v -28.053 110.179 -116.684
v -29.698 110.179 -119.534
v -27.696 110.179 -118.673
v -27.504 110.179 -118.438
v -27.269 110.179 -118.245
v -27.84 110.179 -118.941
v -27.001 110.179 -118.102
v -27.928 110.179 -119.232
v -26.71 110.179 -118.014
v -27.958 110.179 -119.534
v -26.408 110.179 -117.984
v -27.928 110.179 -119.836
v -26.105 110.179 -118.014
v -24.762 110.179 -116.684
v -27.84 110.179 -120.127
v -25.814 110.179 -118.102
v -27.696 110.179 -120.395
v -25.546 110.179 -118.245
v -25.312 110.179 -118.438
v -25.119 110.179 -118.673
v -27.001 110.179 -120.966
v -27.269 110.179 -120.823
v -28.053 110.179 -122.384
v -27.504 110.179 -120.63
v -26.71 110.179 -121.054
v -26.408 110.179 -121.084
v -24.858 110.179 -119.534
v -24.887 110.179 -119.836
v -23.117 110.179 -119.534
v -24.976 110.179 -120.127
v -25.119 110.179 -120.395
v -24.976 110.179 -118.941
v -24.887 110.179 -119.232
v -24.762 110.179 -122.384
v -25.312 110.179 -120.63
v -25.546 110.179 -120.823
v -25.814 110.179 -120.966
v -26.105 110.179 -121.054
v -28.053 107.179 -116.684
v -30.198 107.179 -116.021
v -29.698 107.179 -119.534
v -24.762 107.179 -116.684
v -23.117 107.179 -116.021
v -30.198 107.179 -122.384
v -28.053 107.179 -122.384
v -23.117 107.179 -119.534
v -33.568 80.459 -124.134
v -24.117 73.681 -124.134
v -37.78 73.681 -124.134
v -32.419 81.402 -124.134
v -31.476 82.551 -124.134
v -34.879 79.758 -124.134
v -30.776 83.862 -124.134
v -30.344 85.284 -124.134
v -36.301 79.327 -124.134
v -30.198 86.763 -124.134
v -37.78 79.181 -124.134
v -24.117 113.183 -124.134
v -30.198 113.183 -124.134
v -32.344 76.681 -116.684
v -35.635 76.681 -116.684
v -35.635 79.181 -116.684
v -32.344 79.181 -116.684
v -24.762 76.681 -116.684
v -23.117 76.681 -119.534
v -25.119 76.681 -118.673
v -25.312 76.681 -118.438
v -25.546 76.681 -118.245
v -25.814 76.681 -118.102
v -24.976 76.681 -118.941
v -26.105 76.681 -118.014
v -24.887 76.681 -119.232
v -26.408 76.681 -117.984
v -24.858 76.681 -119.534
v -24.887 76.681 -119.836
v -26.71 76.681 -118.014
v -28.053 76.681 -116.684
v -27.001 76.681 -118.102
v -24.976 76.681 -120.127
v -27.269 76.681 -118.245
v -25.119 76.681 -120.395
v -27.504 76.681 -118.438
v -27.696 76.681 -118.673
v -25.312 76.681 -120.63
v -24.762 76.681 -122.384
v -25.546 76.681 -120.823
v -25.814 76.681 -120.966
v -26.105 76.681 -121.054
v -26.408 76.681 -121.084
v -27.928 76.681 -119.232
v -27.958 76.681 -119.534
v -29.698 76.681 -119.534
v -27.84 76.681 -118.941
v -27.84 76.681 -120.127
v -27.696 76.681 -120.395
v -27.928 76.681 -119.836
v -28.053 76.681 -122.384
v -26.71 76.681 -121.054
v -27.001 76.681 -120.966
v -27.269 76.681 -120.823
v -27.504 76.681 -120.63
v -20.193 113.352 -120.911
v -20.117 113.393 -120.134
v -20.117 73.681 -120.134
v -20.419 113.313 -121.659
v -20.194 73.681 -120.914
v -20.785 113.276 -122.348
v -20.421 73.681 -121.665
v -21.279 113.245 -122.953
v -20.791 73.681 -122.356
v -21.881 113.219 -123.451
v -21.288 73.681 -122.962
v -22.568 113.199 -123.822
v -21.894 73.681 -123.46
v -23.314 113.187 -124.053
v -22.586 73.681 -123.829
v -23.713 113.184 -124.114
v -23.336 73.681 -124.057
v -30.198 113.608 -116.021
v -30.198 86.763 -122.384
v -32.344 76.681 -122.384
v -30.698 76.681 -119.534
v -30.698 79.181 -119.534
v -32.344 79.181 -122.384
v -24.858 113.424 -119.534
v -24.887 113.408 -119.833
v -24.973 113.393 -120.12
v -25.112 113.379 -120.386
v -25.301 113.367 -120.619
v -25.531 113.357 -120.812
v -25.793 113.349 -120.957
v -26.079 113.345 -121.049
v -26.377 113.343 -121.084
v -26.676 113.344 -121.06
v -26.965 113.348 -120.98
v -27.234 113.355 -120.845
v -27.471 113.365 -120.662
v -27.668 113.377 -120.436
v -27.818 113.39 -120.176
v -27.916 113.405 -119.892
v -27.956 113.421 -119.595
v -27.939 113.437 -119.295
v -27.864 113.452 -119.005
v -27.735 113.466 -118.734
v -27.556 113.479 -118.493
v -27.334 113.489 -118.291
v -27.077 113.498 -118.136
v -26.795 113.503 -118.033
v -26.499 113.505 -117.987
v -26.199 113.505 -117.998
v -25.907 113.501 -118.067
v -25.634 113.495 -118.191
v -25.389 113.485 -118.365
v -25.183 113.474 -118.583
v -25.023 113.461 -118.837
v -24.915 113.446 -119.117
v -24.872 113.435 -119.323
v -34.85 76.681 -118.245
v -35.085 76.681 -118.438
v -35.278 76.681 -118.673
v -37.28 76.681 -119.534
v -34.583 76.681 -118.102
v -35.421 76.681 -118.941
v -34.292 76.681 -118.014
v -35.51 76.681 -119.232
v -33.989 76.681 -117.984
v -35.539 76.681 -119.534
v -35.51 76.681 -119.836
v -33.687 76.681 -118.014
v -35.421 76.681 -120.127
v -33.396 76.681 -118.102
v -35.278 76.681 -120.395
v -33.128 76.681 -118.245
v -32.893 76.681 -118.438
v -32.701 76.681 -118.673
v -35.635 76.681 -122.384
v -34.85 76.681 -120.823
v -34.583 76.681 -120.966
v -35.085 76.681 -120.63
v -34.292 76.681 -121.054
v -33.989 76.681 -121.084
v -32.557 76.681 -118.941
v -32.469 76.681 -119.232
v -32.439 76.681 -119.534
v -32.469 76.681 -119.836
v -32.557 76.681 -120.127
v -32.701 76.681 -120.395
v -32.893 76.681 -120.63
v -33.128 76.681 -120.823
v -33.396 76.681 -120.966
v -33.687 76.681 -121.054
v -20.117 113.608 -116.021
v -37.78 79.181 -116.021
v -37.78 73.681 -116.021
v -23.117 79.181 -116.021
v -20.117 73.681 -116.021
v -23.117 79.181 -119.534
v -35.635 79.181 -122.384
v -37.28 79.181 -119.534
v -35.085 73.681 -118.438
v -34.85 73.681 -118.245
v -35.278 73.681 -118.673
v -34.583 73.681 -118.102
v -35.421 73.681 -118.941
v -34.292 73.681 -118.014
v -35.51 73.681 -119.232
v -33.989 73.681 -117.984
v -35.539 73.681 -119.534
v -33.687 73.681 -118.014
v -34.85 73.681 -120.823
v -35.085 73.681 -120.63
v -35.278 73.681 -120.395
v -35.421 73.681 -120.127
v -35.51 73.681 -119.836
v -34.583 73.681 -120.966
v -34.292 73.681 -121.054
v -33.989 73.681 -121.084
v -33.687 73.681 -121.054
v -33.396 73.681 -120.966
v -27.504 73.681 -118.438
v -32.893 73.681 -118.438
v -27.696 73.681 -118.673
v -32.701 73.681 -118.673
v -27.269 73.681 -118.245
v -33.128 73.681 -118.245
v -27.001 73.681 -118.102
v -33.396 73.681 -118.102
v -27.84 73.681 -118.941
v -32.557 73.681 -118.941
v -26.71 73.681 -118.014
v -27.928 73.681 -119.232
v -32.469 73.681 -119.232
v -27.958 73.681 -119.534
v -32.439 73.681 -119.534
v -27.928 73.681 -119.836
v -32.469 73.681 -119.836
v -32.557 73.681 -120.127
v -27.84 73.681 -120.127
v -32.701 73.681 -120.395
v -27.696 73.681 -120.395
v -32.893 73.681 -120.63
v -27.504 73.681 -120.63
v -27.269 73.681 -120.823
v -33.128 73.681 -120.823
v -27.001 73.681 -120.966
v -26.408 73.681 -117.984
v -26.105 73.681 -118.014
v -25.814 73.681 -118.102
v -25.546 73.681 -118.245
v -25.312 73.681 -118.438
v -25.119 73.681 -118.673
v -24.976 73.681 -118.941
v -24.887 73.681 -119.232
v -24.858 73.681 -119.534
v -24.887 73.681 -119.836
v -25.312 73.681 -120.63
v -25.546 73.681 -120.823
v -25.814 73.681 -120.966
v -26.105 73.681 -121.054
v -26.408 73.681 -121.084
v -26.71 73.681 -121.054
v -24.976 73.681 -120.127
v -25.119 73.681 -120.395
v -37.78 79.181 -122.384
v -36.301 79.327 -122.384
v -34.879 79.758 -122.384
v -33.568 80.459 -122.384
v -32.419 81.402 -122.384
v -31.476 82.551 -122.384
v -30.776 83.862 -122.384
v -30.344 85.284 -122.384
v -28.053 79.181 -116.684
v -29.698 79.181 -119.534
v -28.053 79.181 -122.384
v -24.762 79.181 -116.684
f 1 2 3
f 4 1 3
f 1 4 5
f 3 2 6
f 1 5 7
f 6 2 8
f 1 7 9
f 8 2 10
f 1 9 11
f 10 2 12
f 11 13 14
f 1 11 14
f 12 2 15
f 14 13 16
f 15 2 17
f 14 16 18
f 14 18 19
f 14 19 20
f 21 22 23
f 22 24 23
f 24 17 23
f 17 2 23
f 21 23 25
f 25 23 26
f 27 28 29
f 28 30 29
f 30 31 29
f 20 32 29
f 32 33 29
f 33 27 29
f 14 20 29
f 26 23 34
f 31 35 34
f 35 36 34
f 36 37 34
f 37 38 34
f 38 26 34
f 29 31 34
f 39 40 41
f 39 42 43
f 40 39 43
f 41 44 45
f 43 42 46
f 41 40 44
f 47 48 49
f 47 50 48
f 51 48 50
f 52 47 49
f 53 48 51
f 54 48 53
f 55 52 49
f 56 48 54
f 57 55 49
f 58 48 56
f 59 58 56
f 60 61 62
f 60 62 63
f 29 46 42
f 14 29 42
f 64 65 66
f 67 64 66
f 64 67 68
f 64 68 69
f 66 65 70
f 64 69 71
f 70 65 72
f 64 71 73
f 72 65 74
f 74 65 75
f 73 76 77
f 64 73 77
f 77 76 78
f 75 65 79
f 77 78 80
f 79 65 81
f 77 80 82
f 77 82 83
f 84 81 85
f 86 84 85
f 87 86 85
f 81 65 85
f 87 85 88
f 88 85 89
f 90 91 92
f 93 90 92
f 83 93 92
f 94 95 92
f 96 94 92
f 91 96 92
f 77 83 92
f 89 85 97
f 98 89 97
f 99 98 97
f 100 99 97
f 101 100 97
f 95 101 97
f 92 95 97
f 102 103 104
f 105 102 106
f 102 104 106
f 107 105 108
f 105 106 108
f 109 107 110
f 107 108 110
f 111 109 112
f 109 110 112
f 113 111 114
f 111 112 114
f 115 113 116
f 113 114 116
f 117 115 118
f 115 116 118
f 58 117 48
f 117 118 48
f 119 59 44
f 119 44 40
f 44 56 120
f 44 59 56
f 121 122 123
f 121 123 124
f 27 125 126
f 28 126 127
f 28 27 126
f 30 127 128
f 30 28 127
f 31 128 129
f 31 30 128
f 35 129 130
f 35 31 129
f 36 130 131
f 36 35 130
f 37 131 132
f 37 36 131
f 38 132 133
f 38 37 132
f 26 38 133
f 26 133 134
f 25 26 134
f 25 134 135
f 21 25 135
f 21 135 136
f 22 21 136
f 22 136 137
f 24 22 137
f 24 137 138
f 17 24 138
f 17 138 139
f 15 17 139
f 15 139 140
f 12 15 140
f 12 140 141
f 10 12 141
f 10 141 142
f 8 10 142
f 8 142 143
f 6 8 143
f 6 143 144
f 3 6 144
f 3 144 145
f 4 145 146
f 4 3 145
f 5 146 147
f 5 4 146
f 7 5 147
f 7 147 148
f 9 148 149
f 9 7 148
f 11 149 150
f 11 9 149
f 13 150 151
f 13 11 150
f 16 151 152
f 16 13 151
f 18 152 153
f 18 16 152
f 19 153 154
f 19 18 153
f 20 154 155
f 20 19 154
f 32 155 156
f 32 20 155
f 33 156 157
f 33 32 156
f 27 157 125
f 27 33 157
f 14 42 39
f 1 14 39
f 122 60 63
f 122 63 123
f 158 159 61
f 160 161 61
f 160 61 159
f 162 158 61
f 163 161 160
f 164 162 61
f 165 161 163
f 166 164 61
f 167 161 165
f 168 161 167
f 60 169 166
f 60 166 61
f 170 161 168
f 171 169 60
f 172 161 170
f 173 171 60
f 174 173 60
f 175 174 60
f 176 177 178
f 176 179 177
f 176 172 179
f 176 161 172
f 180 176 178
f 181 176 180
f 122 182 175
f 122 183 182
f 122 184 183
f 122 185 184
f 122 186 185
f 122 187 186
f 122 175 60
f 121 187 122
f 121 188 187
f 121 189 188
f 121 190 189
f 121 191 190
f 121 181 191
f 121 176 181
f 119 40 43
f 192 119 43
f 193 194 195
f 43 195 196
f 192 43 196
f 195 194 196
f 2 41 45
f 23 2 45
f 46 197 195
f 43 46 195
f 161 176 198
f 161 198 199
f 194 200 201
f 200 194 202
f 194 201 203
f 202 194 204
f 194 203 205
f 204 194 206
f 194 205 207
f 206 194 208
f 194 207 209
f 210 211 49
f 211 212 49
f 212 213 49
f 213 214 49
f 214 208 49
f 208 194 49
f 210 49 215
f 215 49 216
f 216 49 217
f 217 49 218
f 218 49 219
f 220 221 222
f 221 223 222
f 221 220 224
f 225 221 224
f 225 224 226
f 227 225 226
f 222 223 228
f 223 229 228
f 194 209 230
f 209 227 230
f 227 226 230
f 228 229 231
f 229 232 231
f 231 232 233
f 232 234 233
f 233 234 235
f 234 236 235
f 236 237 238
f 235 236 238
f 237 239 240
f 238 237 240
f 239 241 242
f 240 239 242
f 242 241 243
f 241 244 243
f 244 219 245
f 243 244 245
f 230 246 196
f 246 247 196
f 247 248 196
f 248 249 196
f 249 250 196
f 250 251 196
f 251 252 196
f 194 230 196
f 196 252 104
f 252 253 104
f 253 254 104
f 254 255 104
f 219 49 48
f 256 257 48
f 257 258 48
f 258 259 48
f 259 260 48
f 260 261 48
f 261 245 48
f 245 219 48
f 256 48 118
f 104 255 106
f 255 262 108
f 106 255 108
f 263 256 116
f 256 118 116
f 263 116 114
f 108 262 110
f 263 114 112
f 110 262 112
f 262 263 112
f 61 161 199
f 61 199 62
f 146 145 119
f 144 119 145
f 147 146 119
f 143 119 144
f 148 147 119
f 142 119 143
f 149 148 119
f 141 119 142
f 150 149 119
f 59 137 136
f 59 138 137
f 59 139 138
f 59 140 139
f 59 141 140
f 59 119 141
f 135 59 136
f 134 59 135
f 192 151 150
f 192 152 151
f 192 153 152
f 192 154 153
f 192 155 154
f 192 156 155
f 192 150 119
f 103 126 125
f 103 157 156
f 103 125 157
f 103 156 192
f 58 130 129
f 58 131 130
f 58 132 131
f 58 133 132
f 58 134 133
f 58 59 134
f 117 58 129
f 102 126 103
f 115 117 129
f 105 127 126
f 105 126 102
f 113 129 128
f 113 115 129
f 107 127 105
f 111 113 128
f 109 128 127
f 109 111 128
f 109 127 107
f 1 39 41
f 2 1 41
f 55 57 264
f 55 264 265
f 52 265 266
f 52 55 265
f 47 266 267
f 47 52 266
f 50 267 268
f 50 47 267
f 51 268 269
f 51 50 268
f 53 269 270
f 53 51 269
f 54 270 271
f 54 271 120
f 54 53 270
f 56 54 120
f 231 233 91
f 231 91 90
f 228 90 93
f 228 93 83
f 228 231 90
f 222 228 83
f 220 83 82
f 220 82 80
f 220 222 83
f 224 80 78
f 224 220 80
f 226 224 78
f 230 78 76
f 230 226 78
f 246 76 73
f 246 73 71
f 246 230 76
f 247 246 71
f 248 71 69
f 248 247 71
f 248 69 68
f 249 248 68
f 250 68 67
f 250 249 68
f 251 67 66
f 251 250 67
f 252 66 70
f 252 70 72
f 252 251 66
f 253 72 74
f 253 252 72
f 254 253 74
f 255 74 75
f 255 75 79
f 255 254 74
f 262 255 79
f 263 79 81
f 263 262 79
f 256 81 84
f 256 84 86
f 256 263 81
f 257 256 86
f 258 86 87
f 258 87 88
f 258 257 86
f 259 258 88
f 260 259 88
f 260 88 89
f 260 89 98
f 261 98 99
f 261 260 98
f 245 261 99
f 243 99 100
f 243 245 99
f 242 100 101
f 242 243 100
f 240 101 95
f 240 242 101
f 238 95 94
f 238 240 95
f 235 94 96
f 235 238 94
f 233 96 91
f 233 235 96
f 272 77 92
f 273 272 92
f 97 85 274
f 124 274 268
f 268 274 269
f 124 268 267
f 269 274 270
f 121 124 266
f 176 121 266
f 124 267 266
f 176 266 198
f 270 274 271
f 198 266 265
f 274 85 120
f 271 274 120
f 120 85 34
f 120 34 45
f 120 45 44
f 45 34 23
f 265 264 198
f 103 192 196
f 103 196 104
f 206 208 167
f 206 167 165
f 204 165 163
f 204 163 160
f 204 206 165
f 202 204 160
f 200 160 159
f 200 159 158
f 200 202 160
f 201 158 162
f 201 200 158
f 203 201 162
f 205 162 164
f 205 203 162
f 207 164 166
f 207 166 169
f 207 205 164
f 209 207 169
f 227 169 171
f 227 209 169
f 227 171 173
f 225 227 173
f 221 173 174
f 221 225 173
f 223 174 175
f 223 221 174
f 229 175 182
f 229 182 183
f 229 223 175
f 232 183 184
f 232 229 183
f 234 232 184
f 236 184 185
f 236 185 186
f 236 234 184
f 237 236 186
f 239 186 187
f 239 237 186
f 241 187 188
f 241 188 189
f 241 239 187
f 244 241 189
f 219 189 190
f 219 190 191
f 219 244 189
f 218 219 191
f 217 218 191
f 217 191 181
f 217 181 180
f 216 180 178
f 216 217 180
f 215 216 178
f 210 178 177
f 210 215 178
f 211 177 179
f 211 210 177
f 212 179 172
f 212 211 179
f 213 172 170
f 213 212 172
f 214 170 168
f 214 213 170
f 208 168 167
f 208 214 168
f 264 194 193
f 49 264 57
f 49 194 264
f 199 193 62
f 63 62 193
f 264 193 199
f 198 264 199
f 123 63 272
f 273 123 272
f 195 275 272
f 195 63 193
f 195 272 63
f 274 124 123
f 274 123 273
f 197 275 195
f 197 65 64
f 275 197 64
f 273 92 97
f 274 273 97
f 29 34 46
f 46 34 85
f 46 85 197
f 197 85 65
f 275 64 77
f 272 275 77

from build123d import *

# Parameters (mm, degrees)
SKETCH4_R                 = 1.55
BOSS_EXTRUDE4_DEPTH       = 3
BOSS_EXTRUDE5_START       = 3
BOSS_EXTRUDE5_DEPTH       = 2.5
BOSS_EXTRUDE6_START       = 5.5
BOSS_EXTRUDE6_DEPTH       = 31.423000022
BOSS_EXTRUDE6_START_2     = 116.532620121
BOSS_EXTRUDE6_2_OUTLINE_W = 13
BOSS_EXTRUDE6_2_OUTLINE_H = 11
BOSS_EXTRUDE6_2_DEPTH     = 1.467379879
BOSS_EXTRUDE7_START       = 36.497247904
BOSS_EXTRUDE7_OUTLINE_R   = 1.55
BOSS_EXTRUDE7_DEPTH       = 3.429880261
BOSS_EXTRUDE7_START_2     = 119.532620121
BOSS_EXTRUDE7_2_OUTLINE_W = 13
BOSS_EXTRUDE7_2_OUTLINE_H = 12
BOSS_EXTRUDE7_2_DEPTH     = 1.467379879
BOSS_EXTRUDE8_START       = 33.497248
BOSS_EXTRUDE8_DEPTH       = 3
SKETCH4_12_W              = 7.581793069
SKETCH4_12_H              = 8.112892266
SKETCH4_12_R              = 1.55
BOSS_EXTRUDE10_DEPTH      = 3
BOSS_EXTRUDE11_START      = 3
SKETCH4_13_W              = 7.581793069
SKETCH4_13_H              = 8.112892266
BOSS_EXTRUDE11_DEPTH      = 2.5
BOSS_EXTRUDE12_DEPTH      = 1.75


with BuildPart() as part:
    # Sketch4 → Boss-Extrude4 (new body)
    with BuildSketch(Plane(origin=(0, 73.681369419, 0), x_dir=(1, 0, 0), z_dir=(0, 1, 0))):
        with BuildLine():
            Line((-30.198456841, 124.133918355), (-24.116663772, 124.133918355))
            ThreePointArc((-24.116663772, 124.133918355), (-21.288236648, 122.96234548), (-20.116663772, 120.133918355))
            Line((-20.116663772, 120.133918355), (-20.116663772, 116.021026089))
            Line((-20.116663772, 116.021026089), (-30.198456841, 116.021026089))
            Line((-30.198456841, 116.021026089), (-30.198456841, 124.133918355))
        make_face()
        with Locations(Location((-26.407560307, 119.533918355, 0), (0, 0, 180))):
            Circle(SKETCH4_R, mode=Mode.SUBTRACT)
    extrude(amount=BOSS_EXTRUDE4_DEPTH)

    # Sketch4<5> → Boss-Extrude5 (add)
    with BuildSketch(Plane(origin=(0, 73.681369419, 0), x_dir=(1, 0, 0), z_dir=(0, 1, 0)).offset(BOSS_EXTRUDE5_START)):
        with BuildLine():
            Line((-24.116663772, 124.133918355), (-30.198456841, 124.133918355))
            Line((-30.198456841, 124.133918355), (-30.198456841, 122.383918355))
            Line((-30.198456841, 122.383918355), (-28.053008574, 122.383918355))
            Line((-28.053008574, 122.383918355), (-24.762112039, 122.383918355))
            Line((-24.762112039, 122.383918355), (-23.116663772, 119.533918355))
            Line((-23.116663772, 119.533918355), (-23.116663772, 116.021026089))
            Line((-23.116663772, 116.021026089), (-20.116663772, 116.021026089))
            Line((-20.116663772, 116.021026089), (-20.116663772, 120.133918355))
            ThreePointArc((-20.116663772, 120.133918355), (-21.288236648, 122.96234548), (-24.116663772, 124.133918355))
        make_face()
        Polygon((-28.053008574, 122.383918355), (-30.198456841, 122.383918355), (-30.198456841, 116.021026089), (-23.116663772, 116.021026089), (-23.116663772, 119.533918355), (-24.762112039, 116.683918355), (-28.053008574, 116.683918355), (-29.698456841, 119.533918355), align=None)
    extrude(amount=BOSS_EXTRUDE5_DEPTH)

    # Boss-Extrude6: read off the stored shape, not the designer's step
    # Boss-Extrude6 outline → Boss-Extrude6 (add)
    with BuildSketch(Plane(origin=(0, 73.681369419, 0), x_dir=(1, 0, 0), z_dir=(0, 1, 0)).offset(BOSS_EXTRUDE6_START)):
        with BuildLine():
            Line((-24.116663772, 124.133918355), (-30.198456841, 124.133918355))
            Line((-30.198456841, 124.133918355), (-30.198456841, 122.383918355))
            Line((-30.198456841, 122.383918355), (-24.762112039, 122.383918355))
            Line((-24.762112039, 122.383918355), (-23.116663772, 119.533918355))
            Line((-23.116663772, 119.533918355), (-23.116663772, 116.021026089))
            Line((-23.116663772, 116.021026089), (-20.116663772, 116.021026089))
            Line((-20.116663772, 116.021026089), (-20.116663772, 120.133918355))
            ThreePointArc((-20.116663772, 120.133918355), (-21.288236648, 122.96234548), (-24.116663772, 124.133918355))
        make_face()
    extrude(amount=BOSS_EXTRUDE6_DEPTH)

    # Boss-Extrude6 2 outline → Boss-Extrude6 2 (cut)
    with BuildSketch(Plane(origin=(0, 0, 0), x_dir=(1, 0, 0), z_dir=(0, 0.9986258431157963, -0.05240634943654381)).offset(BOSS_EXTRUDE6_START_2)):
        with Locations((-25.5, 114.5)):
            Rectangle(BOSS_EXTRUDE6_2_OUTLINE_W, BOSS_EXTRUDE6_2_OUTLINE_H)
    extrude(amount=BOSS_EXTRUDE6_2_DEPTH, mode=Mode.SUBTRACT)

    # Boss-Extrude7: read off the stored shape, not the designer's step
    # Boss-Extrude7 outline → Boss-Extrude7 (add)
    with BuildSketch(Plane(origin=(0, 73.681369419, 0), x_dir=(1, 0, 0), z_dir=(0, 1, 0)).offset(BOSS_EXTRUDE7_START)):
        with BuildLine():
            Line((-30.198456841, 116.021026089), (-20.116663772, 116.021026089))
            Line((-20.116663772, 116.021026089), (-20.116663772, 120.133918355))
            ThreePointArc((-20.116663772, 120.133918355), (-21.288236648, 122.96234548), (-24.116663772, 124.133918355))
            Line((-24.116663772, 124.133918355), (-30.198456841, 124.133918355))
            Line((-30.198456841, 124.133918355), (-30.198456841, 116.021026089))
        make_face()
        with Locations((-26.407560307, 119.533918355)):
            Circle(BOSS_EXTRUDE7_OUTLINE_R, mode=Mode.SUBTRACT)
    extrude(amount=BOSS_EXTRUDE7_DEPTH)

    # Boss-Extrude7 2 outline → Boss-Extrude7 2 (cut)
    with BuildSketch(Plane(origin=(0, 0, 0), x_dir=(1, 0, 0), z_dir=(0, 0.9986258431157963, -0.05240634943654381)).offset(BOSS_EXTRUDE7_START_2)):
        with Locations((-25.5, 114)):
            Rectangle(BOSS_EXTRUDE7_2_OUTLINE_W, BOSS_EXTRUDE7_2_OUTLINE_H)
    extrude(amount=BOSS_EXTRUDE7_2_DEPTH, mode=Mode.SUBTRACT)

    # Sketch4<10> → Boss-Extrude8 (add)
    with BuildSketch(Plane(origin=(0, 73.681369419, 0), x_dir=(1, 0, 0), z_dir=(0, 1, 0)).offset(BOSS_EXTRUDE8_START)):
        with BuildLine():
            Line((-24.116663772, 124.133918355), (-30.198456841, 124.133918355))
            Line((-30.198456841, 124.133918355), (-30.198456841, 122.383918355))
            Line((-30.198456841, 122.383918355), (-28.053008574, 122.383918355))
            Line((-28.053008574, 122.383918355), (-24.762112039, 122.383918355))
            Line((-24.762112039, 122.383918355), (-23.116663772, 119.533918355))
            Line((-23.116663772, 119.533918355), (-23.116663772, 116.021026089))
            Line((-23.116663772, 116.021026089), (-20.116663772, 116.021026089))
            Line((-20.116663772, 116.021026089), (-20.116663772, 120.133918355))
            ThreePointArc((-20.116663772, 120.133918355), (-21.288236648, 122.96234548), (-24.116663772, 124.133918355))
        make_face()
        Polygon((-28.053008574, 122.383918355), (-30.198456841, 122.383918355), (-30.198456841, 116.021026089), (-23.116663772, 116.021026089), (-23.116663772, 119.533918355), (-24.762112039, 116.683918355), (-28.053008574, 116.683918355), (-29.698456841, 119.533918355), align=None)
    extrude(amount=BOSS_EXTRUDE8_DEPTH)

    # Sketch4<12> → Boss-Extrude10 (add)
    # profile 1 of 2: a face of its own
    with BuildSketch(Plane(origin=(0, 73.681369419, 0), x_dir=(1, 0, 0), z_dir=(0, 1, 0))):
        with Locations((-33.989353376, 120.077472222)):
            Rectangle(SKETCH4_12_W, SKETCH4_12_H)
        Polygon((-32.343905108, 116.683918355), (-30.698456841, 119.533918355), (-32.343905108, 122.383918355), (-35.634801643, 122.383918355), (-37.28024991, 119.533918355), (-35.634801643, 116.683918355), align=None, mode=Mode.SUBTRACT)
    # profile 2 of 2: a face of its own
    with BuildSketch(Plane(origin=(0, 73.681369419, 0), x_dir=(1, 0, 0), z_dir=(0, 1, 0))):
        Polygon((-35.634801643, 116.683918355), (-32.343905108, 116.683918355), (-30.698456841, 119.533918355), (-32.343905108, 122.383918355), (-35.634801643, 122.383918355), (-37.28024991, 119.533918355), align=None)
        with Locations(Location((-33.989353375, 119.533918355, 0), (0, 0, 180))):
            Circle(SKETCH4_12_R, mode=Mode.SUBTRACT)
    extrude(amount=BOSS_EXTRUDE10_DEPTH)

    # Sketch4<13> → Boss-Extrude11 (add)
    with BuildSketch(Plane(origin=(0, 73.681369419, 0), x_dir=(1, 0, 0), z_dir=(0, 1, 0)).offset(BOSS_EXTRUDE11_START)):
        with Locations((-33.989353376, 120.077472222)):
            Rectangle(SKETCH4_13_W, SKETCH4_13_H)
        Polygon((-32.343905108, 116.683918355), (-30.698456841, 119.533918355), (-32.343905108, 122.383918355), (-35.634801643, 122.383918355), (-37.28024991, 119.533918355), (-35.634801643, 116.683918355), align=None, mode=Mode.SUBTRACT)
    extrude(amount=BOSS_EXTRUDE11_DEPTH)

    # Sketch7 → Boss-Extrude12 (add)
    with BuildSketch(Plane(origin=(0, 0, -124.133918355), x_dir=(-1, 0, 0), z_dir=(0, 0, -1))):
        with BuildLine():
            Line((30.198456841, 79.181369419), (37.78024991, 79.181369419))
            ThreePointArc((37.78024991, 79.181369419), (32.419112617, 81.402025196), (30.198456841, 86.763162488))
            Line((30.198456841, 86.763162488), (30.198456841, 79.181369419))
        make_face()
    extrude(amount=-BOSS_EXTRUDE12_DEPTH)


solid = part.part
